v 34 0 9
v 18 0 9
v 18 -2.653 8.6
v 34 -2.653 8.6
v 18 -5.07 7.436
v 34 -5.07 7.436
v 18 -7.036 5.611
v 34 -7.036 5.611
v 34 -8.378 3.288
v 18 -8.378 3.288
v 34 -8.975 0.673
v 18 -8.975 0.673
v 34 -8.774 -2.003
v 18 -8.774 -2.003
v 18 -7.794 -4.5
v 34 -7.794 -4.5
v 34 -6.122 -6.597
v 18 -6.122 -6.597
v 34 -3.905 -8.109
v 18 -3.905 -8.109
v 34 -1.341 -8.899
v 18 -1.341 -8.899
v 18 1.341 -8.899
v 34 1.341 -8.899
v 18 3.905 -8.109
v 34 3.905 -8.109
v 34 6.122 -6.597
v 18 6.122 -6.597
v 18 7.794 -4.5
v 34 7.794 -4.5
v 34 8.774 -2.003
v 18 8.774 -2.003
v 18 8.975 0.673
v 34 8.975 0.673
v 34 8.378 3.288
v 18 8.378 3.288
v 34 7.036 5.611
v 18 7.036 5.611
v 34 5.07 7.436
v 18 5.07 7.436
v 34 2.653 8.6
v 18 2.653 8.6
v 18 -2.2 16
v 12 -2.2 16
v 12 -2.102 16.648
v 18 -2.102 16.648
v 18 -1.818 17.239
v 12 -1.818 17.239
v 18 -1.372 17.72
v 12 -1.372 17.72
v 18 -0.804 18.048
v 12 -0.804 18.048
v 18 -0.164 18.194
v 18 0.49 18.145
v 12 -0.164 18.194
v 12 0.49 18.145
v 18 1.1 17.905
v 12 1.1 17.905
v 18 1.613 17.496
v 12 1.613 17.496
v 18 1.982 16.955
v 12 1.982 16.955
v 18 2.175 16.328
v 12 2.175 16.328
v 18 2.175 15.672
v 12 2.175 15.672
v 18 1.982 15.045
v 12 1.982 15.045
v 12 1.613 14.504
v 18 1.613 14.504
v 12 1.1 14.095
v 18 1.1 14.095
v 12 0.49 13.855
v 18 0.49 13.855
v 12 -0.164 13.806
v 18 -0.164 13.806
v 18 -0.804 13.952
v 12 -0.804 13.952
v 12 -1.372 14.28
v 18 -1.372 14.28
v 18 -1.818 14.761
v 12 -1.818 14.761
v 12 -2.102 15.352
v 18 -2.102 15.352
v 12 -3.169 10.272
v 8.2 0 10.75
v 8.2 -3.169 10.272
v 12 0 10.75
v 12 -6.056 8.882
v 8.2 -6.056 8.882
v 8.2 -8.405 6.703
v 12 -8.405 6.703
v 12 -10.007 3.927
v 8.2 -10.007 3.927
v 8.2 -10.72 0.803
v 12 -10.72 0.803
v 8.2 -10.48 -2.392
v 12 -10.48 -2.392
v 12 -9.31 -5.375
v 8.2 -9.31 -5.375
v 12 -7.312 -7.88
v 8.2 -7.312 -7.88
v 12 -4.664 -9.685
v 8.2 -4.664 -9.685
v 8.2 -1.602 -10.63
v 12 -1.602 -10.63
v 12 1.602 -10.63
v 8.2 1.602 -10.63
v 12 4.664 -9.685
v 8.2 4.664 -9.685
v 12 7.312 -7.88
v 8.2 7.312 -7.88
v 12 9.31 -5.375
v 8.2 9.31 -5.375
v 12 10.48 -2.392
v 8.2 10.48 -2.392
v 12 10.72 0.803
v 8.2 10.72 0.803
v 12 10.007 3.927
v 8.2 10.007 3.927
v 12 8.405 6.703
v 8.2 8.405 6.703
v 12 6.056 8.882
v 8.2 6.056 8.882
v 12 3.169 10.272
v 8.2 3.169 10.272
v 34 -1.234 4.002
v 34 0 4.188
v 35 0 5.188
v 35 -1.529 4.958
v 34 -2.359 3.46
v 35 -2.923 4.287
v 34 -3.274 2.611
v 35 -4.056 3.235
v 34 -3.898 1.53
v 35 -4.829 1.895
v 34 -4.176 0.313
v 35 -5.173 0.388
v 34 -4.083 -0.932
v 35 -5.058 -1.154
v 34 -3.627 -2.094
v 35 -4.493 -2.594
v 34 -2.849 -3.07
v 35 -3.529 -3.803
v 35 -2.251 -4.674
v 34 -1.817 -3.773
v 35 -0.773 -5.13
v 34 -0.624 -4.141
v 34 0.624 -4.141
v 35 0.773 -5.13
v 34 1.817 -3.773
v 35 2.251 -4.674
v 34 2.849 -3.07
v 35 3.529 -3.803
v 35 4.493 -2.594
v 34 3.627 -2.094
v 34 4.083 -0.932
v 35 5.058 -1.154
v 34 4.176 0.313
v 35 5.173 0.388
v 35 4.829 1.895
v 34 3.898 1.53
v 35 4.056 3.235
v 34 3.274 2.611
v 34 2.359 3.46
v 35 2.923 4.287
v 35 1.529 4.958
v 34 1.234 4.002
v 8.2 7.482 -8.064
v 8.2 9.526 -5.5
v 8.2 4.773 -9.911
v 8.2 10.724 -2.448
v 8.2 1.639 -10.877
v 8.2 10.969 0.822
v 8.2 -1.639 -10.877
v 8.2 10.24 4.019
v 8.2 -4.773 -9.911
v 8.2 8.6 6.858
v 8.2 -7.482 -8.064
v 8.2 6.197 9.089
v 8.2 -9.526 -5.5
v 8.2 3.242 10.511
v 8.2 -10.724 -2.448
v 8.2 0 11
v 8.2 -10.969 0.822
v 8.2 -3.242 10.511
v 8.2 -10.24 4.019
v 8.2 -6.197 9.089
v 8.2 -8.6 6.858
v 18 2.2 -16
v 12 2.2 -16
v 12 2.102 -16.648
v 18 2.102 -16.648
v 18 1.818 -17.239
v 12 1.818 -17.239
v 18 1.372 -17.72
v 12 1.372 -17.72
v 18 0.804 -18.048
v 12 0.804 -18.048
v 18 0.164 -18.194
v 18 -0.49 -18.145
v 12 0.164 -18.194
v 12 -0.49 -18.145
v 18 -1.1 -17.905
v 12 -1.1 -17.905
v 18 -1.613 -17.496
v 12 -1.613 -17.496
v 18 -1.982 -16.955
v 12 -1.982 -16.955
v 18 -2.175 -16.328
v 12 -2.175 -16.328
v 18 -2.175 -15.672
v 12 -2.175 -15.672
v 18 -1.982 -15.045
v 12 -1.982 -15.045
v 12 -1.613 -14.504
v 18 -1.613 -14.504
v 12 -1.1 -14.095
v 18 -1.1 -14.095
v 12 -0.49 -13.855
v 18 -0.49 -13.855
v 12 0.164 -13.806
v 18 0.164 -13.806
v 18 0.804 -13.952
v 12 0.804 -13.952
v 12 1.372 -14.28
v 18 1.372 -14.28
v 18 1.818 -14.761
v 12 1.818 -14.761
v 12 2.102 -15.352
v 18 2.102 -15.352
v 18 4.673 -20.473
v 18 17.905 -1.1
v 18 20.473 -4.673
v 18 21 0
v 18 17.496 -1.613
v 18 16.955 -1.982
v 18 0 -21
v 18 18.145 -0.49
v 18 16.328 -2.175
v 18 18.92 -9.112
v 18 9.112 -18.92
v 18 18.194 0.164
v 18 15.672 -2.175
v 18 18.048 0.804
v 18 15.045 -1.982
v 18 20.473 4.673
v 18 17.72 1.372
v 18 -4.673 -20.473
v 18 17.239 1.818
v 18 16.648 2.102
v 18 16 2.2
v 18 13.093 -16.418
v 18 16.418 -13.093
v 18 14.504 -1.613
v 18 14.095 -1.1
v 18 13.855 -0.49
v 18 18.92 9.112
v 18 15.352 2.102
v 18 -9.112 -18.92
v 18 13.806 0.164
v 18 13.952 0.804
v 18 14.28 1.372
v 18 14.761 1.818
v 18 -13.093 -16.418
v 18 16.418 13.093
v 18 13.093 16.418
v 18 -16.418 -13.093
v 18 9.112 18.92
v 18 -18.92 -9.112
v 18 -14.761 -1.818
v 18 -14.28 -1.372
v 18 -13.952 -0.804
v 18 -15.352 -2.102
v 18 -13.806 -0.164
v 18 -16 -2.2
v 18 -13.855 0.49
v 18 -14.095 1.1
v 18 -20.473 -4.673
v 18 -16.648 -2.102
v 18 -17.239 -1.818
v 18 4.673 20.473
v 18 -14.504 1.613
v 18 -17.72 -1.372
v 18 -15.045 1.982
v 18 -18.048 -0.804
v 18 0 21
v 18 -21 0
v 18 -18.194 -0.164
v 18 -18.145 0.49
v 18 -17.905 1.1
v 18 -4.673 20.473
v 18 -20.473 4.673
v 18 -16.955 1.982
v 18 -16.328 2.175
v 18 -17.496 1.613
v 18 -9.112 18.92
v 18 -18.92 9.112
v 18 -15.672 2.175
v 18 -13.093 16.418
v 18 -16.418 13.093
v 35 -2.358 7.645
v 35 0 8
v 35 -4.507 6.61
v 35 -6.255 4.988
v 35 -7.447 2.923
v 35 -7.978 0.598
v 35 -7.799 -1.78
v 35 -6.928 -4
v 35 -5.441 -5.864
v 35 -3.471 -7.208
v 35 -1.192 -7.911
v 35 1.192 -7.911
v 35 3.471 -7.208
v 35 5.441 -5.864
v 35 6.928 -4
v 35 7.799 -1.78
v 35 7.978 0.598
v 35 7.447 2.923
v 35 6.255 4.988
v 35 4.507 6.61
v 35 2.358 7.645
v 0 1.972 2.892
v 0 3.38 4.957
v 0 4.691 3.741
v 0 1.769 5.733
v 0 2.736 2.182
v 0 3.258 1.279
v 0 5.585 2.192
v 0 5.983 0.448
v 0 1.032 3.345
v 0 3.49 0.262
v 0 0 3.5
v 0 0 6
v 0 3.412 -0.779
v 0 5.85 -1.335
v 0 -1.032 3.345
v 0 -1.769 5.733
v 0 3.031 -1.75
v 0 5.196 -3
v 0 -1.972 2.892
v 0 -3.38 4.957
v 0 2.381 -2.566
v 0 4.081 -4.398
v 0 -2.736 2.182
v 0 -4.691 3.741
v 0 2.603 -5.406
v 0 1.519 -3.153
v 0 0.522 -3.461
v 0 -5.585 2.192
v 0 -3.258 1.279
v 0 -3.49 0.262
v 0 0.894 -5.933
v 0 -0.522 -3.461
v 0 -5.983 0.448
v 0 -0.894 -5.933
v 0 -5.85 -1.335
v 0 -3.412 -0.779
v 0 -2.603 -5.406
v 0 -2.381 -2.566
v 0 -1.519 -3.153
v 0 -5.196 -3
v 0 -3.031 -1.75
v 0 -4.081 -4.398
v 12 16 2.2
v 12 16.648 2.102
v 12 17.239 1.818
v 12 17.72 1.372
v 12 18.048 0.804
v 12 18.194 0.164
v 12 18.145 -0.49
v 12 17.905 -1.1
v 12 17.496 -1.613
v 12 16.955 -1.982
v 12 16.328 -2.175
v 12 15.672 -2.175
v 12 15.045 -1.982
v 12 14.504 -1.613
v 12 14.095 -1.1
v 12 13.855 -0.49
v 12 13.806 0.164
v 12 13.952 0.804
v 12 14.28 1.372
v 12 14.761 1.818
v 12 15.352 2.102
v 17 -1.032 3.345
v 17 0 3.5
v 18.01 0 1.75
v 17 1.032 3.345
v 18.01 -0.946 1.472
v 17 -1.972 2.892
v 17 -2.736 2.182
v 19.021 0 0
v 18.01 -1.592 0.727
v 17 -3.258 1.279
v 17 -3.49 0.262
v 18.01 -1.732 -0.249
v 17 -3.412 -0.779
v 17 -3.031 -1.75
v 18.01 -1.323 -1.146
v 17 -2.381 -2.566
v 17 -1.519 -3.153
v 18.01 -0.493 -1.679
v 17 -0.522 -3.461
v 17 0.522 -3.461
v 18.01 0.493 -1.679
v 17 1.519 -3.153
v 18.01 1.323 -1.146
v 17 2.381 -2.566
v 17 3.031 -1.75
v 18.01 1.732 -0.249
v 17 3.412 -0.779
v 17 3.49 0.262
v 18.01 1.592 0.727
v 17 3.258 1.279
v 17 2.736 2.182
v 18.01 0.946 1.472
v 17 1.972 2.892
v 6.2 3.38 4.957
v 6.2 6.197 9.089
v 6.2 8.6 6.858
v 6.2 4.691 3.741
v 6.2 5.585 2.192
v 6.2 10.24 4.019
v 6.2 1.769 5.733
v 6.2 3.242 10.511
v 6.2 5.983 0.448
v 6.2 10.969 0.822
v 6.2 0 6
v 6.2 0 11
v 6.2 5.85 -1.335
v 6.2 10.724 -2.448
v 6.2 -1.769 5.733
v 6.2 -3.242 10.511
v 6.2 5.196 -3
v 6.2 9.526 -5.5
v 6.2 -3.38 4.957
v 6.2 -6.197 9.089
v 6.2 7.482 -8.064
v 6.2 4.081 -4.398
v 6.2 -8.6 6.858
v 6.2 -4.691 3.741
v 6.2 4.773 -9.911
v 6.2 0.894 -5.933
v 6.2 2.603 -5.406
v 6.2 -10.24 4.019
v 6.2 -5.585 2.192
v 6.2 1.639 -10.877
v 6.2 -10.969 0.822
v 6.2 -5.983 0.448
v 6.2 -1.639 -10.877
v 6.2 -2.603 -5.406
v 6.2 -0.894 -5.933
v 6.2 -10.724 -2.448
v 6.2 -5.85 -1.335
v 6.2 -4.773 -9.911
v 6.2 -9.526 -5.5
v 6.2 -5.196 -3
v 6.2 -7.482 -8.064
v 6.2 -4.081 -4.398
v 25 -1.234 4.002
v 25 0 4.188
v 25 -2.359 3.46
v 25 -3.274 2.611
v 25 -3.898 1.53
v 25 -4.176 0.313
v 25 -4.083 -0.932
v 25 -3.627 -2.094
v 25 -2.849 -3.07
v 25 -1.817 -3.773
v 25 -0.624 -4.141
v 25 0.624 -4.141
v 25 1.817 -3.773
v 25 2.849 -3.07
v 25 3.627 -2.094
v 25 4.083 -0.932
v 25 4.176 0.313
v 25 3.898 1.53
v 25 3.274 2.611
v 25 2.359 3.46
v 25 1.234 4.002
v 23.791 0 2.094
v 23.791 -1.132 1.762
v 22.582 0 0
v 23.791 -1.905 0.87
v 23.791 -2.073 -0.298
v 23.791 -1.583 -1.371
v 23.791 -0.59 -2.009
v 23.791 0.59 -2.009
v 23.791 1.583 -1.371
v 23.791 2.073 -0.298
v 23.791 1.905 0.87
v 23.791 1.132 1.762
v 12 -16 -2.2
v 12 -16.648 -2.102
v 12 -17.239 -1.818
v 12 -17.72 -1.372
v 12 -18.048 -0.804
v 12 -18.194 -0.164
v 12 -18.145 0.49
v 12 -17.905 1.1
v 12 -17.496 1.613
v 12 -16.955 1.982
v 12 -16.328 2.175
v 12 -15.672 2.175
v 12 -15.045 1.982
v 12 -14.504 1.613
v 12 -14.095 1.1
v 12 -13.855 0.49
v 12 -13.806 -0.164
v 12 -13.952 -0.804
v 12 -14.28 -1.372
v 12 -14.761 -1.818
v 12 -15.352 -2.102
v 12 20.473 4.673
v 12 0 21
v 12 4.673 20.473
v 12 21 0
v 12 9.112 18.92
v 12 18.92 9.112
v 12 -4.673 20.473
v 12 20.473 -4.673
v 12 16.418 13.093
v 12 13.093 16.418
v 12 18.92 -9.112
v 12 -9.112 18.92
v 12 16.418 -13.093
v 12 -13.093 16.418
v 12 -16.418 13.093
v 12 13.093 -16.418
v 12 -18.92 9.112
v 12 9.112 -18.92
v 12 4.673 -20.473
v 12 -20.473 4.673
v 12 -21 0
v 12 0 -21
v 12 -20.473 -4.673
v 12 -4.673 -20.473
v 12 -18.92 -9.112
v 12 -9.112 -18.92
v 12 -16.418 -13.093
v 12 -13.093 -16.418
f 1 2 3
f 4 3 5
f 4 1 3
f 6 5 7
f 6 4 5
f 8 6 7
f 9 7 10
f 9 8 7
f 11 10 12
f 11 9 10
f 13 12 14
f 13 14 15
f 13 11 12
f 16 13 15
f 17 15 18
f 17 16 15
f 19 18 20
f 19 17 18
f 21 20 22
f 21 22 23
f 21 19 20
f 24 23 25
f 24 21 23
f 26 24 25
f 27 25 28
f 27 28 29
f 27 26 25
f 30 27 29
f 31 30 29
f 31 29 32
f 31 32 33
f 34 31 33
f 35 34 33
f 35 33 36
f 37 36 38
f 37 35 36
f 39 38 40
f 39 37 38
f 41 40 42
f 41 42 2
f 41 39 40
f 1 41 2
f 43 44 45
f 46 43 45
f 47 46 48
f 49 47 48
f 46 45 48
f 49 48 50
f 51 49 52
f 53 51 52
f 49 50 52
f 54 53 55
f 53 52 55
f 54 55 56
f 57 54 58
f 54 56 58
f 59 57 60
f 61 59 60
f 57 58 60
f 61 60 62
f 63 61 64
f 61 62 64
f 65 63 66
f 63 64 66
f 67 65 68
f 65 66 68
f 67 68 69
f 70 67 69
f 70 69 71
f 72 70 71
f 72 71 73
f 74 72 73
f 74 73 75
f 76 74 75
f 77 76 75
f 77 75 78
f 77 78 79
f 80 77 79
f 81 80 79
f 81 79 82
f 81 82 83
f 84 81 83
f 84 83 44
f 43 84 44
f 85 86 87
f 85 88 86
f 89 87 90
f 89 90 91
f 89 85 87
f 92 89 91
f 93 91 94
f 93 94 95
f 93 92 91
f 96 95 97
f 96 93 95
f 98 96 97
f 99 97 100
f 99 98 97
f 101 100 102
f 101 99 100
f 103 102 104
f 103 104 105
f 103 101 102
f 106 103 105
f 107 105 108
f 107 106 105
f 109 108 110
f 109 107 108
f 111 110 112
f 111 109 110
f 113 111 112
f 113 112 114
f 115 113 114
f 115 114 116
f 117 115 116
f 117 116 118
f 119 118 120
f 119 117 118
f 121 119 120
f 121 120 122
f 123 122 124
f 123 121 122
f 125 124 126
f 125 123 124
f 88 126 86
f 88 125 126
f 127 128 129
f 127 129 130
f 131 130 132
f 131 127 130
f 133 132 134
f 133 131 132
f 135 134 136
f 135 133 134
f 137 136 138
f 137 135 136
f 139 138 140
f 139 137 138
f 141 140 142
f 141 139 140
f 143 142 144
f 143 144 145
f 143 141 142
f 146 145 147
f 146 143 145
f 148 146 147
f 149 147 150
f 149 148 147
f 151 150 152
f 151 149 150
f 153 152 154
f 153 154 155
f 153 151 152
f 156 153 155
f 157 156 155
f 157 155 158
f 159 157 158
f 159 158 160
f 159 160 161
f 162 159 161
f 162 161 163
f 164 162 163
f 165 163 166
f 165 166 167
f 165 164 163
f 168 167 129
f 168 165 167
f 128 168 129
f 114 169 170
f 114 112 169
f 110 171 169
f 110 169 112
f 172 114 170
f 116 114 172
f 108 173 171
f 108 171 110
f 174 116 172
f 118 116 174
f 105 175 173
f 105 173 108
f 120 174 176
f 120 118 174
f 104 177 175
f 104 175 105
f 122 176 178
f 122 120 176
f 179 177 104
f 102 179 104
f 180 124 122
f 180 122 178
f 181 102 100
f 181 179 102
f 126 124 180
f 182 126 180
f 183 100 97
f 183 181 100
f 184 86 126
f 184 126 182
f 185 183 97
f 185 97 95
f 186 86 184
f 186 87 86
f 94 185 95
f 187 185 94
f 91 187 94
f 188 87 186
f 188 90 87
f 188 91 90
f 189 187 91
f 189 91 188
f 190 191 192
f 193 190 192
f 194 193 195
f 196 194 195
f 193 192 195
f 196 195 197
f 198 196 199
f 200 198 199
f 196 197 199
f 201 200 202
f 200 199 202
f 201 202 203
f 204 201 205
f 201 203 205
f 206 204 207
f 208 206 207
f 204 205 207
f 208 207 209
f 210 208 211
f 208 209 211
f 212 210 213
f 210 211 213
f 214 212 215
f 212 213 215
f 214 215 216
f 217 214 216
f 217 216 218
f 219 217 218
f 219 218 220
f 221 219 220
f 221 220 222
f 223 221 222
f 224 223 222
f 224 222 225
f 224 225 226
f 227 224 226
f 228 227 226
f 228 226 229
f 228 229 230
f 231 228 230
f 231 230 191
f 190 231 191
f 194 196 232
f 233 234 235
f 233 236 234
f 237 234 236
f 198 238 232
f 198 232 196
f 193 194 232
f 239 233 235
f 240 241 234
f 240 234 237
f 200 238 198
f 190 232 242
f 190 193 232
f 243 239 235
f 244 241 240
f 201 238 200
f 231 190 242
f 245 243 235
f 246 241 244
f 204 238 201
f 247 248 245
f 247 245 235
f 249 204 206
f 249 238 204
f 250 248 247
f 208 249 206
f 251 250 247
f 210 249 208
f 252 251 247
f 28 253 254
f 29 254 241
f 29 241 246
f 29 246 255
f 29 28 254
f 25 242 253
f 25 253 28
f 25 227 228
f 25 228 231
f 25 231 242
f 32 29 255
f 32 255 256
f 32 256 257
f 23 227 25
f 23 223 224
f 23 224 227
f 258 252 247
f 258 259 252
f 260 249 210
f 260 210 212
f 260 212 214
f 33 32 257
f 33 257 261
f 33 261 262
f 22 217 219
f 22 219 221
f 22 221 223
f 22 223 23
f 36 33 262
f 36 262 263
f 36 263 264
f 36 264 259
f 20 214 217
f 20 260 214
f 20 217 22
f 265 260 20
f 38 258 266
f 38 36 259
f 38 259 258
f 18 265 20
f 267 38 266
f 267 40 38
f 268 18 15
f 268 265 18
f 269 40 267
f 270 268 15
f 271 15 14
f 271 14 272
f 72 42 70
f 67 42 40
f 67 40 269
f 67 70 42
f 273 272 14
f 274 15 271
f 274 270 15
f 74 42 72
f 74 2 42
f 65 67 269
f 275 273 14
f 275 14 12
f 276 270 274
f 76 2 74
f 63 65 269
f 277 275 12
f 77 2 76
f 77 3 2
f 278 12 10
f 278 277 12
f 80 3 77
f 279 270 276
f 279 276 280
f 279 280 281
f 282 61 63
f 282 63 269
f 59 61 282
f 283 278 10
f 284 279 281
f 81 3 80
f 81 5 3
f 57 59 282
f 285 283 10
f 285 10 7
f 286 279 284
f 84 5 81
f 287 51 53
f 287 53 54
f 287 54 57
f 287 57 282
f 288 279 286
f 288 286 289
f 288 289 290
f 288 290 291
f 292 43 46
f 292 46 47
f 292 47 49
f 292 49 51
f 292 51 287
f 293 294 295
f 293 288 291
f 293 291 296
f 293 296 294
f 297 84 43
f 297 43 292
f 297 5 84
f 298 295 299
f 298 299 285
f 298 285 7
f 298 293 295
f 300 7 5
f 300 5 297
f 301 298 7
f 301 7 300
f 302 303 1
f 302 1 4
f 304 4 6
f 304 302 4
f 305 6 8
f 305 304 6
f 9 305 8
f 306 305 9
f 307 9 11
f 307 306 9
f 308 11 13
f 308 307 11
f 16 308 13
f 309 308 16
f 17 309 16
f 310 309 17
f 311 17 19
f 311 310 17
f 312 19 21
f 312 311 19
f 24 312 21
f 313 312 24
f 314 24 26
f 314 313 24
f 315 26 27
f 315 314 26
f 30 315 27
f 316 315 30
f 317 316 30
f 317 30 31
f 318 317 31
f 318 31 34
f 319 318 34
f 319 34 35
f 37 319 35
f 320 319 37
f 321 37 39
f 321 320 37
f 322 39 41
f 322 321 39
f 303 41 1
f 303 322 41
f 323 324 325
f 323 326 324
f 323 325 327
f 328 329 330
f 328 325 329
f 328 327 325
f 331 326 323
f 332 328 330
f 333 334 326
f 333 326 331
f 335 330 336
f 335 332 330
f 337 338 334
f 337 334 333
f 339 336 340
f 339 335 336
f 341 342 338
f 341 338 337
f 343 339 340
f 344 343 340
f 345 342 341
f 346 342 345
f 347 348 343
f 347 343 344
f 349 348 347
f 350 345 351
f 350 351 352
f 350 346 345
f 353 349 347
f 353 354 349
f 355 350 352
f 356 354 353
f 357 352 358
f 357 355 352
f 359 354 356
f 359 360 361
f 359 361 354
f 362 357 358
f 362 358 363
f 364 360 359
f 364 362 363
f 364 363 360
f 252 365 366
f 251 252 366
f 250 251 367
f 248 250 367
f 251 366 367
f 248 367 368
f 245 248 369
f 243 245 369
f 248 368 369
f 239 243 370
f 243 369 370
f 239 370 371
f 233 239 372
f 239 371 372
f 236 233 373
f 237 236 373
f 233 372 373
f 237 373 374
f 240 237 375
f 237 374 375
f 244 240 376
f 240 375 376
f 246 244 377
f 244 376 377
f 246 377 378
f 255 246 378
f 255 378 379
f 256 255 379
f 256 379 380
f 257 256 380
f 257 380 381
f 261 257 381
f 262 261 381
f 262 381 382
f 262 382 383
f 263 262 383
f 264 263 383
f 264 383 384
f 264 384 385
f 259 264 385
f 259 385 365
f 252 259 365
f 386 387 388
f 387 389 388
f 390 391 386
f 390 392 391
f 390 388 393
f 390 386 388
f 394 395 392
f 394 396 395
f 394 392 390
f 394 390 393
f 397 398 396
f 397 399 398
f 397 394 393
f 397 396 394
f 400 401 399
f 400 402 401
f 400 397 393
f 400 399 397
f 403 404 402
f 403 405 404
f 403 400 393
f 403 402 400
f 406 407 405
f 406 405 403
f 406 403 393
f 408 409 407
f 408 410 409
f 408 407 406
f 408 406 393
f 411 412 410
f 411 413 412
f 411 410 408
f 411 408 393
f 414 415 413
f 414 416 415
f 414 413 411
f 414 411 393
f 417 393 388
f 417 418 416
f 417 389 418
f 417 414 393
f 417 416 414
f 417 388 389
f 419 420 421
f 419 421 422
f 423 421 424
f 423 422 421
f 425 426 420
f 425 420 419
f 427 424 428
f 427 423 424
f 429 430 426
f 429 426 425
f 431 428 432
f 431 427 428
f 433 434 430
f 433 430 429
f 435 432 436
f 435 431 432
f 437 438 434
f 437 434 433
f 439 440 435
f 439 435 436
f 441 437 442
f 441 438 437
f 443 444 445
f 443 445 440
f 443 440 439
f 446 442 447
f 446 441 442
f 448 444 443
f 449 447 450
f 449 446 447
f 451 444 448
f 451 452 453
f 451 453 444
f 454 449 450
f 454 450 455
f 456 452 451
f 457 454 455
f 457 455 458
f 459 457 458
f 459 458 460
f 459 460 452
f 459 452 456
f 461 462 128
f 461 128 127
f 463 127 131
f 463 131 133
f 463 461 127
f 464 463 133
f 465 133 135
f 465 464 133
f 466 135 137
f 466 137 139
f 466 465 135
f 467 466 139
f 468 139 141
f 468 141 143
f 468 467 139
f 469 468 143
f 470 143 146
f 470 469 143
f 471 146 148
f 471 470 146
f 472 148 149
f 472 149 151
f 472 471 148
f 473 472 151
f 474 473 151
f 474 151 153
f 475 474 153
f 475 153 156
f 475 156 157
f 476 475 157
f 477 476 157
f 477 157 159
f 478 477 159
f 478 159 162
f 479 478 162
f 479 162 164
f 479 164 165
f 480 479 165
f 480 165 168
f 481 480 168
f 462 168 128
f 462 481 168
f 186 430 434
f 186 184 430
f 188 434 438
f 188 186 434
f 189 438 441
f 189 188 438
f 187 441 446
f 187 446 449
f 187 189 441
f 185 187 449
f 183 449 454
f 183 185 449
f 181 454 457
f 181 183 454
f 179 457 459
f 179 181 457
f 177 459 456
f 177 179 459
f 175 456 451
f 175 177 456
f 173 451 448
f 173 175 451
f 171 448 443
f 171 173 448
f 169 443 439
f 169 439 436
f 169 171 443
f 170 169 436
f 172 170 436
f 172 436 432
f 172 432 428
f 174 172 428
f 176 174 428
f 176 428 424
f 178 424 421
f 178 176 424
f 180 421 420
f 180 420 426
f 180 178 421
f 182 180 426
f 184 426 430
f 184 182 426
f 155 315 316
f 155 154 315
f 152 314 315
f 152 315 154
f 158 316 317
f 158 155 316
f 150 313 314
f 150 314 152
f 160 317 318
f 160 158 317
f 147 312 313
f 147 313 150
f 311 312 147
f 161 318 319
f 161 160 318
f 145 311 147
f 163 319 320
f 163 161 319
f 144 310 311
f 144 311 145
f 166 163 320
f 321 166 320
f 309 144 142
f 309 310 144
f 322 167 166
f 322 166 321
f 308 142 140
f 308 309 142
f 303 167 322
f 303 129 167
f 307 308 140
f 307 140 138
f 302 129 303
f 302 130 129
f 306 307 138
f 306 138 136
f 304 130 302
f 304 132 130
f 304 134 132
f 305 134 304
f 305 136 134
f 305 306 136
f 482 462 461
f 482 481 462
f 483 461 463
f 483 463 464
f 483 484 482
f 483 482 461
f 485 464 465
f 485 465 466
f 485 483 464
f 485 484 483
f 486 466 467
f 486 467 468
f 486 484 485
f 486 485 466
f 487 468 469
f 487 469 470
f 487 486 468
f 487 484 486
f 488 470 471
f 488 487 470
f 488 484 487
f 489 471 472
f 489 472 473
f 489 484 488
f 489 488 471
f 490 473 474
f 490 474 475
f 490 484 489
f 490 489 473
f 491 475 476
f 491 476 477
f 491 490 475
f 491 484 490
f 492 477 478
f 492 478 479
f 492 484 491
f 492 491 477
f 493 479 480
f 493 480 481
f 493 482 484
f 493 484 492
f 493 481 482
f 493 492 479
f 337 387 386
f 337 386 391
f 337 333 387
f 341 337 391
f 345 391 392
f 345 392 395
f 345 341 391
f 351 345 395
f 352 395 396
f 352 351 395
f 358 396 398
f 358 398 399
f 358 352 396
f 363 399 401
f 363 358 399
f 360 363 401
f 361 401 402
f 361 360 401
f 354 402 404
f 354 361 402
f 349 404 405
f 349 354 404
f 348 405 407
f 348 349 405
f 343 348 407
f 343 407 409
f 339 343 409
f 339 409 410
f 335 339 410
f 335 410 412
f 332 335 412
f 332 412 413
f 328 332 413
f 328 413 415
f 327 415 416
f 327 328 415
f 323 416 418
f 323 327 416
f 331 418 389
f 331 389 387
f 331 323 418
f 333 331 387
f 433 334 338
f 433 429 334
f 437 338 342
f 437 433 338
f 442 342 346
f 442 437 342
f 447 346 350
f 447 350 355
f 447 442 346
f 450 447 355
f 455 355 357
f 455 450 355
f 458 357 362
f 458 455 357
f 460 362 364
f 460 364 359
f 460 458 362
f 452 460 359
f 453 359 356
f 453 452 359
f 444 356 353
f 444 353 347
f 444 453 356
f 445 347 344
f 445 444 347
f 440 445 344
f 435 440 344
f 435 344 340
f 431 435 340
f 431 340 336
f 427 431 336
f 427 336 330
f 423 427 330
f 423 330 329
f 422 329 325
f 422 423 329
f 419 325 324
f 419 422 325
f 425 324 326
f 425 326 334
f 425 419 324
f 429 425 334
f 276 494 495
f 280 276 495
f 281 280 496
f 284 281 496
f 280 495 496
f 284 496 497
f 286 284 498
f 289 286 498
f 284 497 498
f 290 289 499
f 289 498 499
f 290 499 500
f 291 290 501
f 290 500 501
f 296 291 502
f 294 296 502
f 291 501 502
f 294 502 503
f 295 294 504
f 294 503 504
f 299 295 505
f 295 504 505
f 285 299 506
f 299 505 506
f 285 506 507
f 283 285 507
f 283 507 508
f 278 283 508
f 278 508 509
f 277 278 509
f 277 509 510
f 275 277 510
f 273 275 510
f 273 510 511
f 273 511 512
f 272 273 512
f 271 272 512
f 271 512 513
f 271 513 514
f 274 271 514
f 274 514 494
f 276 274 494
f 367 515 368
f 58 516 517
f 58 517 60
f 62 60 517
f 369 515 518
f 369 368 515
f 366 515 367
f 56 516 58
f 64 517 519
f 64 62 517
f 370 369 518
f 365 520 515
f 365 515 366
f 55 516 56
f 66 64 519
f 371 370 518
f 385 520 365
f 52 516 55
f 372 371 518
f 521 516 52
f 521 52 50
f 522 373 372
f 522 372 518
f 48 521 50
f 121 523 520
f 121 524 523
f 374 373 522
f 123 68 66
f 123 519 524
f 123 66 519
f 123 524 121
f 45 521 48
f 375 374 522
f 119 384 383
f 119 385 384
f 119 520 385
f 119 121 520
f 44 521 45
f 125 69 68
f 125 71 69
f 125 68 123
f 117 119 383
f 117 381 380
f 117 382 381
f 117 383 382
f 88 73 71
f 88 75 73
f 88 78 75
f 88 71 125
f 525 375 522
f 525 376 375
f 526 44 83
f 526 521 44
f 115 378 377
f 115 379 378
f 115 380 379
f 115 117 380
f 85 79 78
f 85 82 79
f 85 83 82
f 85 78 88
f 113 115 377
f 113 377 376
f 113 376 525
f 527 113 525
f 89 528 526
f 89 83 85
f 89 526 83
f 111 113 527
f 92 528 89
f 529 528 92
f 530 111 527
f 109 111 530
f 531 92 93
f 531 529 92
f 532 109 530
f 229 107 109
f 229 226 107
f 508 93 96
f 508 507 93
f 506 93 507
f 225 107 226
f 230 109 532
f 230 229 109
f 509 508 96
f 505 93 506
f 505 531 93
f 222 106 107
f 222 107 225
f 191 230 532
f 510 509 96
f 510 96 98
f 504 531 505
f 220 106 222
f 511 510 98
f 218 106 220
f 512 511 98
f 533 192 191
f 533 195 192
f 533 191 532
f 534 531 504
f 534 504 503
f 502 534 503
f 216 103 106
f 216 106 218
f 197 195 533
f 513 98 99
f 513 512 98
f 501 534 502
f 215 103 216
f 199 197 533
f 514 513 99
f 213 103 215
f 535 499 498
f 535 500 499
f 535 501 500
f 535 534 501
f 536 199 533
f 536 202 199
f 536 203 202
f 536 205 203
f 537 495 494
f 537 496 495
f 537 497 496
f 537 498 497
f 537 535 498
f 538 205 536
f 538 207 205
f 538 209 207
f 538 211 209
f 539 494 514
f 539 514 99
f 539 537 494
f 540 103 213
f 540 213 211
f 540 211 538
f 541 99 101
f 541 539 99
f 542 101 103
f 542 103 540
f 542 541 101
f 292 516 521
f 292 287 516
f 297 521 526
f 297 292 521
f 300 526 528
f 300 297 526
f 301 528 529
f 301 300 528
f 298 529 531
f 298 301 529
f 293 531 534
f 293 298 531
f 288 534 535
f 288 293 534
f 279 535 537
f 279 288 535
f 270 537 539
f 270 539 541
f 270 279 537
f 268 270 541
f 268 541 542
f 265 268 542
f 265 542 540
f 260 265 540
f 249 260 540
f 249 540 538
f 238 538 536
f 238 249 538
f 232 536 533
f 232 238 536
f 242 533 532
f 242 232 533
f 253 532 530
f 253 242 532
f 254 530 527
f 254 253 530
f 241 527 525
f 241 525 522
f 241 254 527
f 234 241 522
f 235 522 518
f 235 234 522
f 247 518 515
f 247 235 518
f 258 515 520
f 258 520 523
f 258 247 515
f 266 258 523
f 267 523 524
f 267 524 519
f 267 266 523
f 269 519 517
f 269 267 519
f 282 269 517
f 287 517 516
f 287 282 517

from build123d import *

# Parameters (mm, degrees)
CHAMFER_1_SIZE           = 1
SKETCH_2_R               = 2.2
CUT_EXTRUDE_1_DEPTH      = 38.563279942
PATTERN_CIRCULAR_1_COUNT = 4


with BuildPart() as part:
    # Эскиз1 → Повернуть1 (revolve)
    with BuildSketch(Plane.XY, mode=Mode.PRIVATE) as revolve_1_sk:
        Polygon((0, -3.5), (0, -6), (6.2, -6), (6.2, -11), (8.2, -11), (8.2, -10.75), (12, -10.75), (12, -21), (18, -21), (18, -9), (35, -9), (35, -4.188), (25, -4.188), (22.582057073, 0), (19.020725942, 0), (17, -3.5), align=None)
    revolve(revolve_1_sk.sketch.rotate(Axis((0, 0, 0), (1, 0, 0)), 270), axis=Axis((0, 0, 0), (1, 0, 0)))

    # Фаска1
    chamfer_1_edges = [part.edges().sort_by_distance(p)[0] for p in [
        (35, 0, -4.188),
        (35, 0, -9),
    ]]
    chamfer(chamfer_1_edges, length=CHAMFER_1_SIZE)

    # Эскиз2 → Вырез-Вытянуть1 (cut, through all)
    with BuildSketch(Plane.ZY.offset(-12)):
        with Locations((0, 16)):
            Circle(SKETCH_2_R)
    cut_extrude_1 = extrude(amount=-CUT_EXTRUDE_1_DEPTH, mode=Mode.SUBTRACT)

    # Круговой массив1: Вырез-Вытянуть1 ×4 about axis
    pattern_circular_1_axis = Axis((0, 0, 0), (1, 0, 0))
    for i in range(1, PATTERN_CIRCULAR_1_COUNT):
        add(cut_extrude_1.rotate(pattern_circular_1_axis, i * 360 / PATTERN_CIRCULAR_1_COUNT), mode=Mode.SUBTRACT)


solid = part.part
